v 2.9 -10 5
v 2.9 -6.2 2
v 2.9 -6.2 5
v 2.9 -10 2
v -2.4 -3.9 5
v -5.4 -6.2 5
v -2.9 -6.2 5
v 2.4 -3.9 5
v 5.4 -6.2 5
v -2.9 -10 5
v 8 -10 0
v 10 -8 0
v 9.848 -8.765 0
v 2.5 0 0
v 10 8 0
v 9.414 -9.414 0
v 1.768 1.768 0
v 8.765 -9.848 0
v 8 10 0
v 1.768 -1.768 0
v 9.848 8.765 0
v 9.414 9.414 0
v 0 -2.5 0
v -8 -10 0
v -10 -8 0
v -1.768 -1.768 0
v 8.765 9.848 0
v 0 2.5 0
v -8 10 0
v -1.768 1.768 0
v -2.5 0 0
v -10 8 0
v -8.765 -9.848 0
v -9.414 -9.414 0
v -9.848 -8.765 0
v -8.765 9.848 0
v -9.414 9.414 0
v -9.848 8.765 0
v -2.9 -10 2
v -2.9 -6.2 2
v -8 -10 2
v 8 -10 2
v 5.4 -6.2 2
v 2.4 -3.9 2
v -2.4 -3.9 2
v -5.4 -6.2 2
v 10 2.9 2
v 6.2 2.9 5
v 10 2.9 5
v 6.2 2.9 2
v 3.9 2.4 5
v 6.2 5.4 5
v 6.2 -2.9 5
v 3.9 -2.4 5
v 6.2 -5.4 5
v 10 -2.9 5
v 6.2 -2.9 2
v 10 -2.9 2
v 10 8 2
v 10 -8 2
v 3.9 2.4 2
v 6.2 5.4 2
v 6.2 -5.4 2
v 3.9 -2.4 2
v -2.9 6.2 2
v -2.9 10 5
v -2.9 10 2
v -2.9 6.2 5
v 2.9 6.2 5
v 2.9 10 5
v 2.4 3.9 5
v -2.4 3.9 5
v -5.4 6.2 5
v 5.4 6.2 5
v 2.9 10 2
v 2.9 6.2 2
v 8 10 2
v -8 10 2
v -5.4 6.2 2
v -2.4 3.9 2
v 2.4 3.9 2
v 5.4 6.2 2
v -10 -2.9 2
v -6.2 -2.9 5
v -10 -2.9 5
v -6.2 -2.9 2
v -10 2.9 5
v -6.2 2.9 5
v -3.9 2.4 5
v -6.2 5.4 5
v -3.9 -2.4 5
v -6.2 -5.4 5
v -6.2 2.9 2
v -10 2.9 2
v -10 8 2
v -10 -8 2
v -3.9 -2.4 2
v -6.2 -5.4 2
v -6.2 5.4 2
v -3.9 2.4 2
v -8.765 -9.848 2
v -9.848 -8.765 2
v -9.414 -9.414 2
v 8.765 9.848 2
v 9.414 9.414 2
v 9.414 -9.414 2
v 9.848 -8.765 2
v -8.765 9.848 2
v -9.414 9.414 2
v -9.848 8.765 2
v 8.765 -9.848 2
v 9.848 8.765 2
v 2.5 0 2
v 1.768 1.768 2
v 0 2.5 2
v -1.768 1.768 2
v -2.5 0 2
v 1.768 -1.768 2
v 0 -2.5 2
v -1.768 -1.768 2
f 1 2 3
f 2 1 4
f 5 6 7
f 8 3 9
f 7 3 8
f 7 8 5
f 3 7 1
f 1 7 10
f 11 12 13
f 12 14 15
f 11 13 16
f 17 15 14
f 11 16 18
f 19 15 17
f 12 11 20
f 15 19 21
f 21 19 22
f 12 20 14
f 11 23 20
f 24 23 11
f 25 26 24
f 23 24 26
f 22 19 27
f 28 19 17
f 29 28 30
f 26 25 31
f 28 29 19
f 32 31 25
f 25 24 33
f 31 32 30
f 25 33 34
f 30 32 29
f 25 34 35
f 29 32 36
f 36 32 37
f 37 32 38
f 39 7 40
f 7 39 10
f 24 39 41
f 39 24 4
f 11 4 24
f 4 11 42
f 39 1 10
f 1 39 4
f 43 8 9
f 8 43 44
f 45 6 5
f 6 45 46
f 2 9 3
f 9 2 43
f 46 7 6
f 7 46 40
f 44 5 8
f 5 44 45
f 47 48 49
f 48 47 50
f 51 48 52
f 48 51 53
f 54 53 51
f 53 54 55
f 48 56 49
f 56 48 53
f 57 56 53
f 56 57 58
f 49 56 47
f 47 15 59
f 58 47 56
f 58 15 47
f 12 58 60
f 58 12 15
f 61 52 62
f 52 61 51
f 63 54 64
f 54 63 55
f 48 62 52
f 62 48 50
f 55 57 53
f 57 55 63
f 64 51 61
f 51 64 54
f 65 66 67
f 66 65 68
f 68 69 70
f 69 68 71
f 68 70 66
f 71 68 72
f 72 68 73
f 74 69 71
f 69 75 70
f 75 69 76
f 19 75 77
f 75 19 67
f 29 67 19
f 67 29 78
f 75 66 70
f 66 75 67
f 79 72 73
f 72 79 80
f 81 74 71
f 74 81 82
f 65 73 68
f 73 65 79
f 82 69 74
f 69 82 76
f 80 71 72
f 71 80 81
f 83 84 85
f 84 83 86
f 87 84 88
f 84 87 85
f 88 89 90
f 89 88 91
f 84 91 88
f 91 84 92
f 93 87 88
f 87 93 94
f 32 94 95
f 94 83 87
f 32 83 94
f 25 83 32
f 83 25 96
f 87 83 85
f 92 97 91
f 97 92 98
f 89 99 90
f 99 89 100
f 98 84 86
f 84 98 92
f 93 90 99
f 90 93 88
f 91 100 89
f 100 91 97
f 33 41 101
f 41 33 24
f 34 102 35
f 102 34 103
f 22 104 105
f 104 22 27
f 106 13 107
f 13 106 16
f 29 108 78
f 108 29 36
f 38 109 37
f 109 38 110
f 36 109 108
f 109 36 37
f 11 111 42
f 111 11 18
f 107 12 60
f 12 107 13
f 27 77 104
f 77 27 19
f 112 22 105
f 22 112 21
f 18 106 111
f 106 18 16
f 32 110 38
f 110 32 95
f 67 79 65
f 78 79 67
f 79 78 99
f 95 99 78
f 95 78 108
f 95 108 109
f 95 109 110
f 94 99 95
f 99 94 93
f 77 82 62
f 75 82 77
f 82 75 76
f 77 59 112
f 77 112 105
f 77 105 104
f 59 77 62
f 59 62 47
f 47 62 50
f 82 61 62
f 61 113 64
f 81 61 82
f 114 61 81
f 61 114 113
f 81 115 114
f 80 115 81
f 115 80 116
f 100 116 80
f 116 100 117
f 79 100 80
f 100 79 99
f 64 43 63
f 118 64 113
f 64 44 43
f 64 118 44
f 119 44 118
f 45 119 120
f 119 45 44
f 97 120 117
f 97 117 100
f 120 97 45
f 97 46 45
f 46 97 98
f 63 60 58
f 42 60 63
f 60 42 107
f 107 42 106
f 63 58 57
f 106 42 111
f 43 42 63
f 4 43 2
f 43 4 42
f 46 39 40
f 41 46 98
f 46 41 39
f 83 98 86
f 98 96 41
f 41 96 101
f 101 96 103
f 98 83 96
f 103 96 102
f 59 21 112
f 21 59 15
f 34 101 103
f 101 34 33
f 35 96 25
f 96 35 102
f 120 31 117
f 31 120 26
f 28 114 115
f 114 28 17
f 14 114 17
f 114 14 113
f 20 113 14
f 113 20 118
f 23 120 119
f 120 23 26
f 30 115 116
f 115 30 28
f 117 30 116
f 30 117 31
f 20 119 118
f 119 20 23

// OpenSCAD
slot_width=6;
slot_thickness=2;
t_width=6;
t_depth=2;
trap_bot_width=11;
trap_top_width=5;
trap_depth=2.5;

extrusion_width=20;
cover_thickness=2;
corner_rounding=2;
hole_size=5;

tab_height=5;

undersize=0.2;			//this may need be adjusted for a good fit

difference() {
	union() {
		for (a=[0:3])
			rotate([0,0,90*a])
				translate([0,-extrusion_width/2,0])
					t_slot();
		
		translate([-extrusion_width/2+corner_rounding, -extrusion_width/2+corner_rounding,0])
			minkowski() {
				cube([extrusion_width-corner_rounding*2,extrusion_width-corner_rounding*2,cover_thickness-1]);
				cylinder(r=corner_rounding, h=1, $fn=16);
			}
	}
	cylinder(r=hole_size/2, h=cover_thickness*4, center=true);
}

module t_slot() {
	translate([-slot_width/2+undersize/2,0,0])
		cube([slot_width-undersize, slot_thickness+t_depth, tab_height]);
	translate([-t_width/2+undersize/2,slot_thickness,0])
		cube([t_width-undersize,t_depth-undersize+0.01,tab_height]);
	translate([0,slot_thickness+t_depth-undersize,0])
		linear_extrude(height=tab_height)
			trapezoid(bottom=trap_bot_width-undersize, top=trap_top_width-undersize, height=trap_depth-undersize);
}


module trapezoid(bottom=10, top=5, height=2)
{
	polygon(points=[[-bottom/2,0],[bottom/2,0],[top/2,height],[-top/2,height]]);
}
